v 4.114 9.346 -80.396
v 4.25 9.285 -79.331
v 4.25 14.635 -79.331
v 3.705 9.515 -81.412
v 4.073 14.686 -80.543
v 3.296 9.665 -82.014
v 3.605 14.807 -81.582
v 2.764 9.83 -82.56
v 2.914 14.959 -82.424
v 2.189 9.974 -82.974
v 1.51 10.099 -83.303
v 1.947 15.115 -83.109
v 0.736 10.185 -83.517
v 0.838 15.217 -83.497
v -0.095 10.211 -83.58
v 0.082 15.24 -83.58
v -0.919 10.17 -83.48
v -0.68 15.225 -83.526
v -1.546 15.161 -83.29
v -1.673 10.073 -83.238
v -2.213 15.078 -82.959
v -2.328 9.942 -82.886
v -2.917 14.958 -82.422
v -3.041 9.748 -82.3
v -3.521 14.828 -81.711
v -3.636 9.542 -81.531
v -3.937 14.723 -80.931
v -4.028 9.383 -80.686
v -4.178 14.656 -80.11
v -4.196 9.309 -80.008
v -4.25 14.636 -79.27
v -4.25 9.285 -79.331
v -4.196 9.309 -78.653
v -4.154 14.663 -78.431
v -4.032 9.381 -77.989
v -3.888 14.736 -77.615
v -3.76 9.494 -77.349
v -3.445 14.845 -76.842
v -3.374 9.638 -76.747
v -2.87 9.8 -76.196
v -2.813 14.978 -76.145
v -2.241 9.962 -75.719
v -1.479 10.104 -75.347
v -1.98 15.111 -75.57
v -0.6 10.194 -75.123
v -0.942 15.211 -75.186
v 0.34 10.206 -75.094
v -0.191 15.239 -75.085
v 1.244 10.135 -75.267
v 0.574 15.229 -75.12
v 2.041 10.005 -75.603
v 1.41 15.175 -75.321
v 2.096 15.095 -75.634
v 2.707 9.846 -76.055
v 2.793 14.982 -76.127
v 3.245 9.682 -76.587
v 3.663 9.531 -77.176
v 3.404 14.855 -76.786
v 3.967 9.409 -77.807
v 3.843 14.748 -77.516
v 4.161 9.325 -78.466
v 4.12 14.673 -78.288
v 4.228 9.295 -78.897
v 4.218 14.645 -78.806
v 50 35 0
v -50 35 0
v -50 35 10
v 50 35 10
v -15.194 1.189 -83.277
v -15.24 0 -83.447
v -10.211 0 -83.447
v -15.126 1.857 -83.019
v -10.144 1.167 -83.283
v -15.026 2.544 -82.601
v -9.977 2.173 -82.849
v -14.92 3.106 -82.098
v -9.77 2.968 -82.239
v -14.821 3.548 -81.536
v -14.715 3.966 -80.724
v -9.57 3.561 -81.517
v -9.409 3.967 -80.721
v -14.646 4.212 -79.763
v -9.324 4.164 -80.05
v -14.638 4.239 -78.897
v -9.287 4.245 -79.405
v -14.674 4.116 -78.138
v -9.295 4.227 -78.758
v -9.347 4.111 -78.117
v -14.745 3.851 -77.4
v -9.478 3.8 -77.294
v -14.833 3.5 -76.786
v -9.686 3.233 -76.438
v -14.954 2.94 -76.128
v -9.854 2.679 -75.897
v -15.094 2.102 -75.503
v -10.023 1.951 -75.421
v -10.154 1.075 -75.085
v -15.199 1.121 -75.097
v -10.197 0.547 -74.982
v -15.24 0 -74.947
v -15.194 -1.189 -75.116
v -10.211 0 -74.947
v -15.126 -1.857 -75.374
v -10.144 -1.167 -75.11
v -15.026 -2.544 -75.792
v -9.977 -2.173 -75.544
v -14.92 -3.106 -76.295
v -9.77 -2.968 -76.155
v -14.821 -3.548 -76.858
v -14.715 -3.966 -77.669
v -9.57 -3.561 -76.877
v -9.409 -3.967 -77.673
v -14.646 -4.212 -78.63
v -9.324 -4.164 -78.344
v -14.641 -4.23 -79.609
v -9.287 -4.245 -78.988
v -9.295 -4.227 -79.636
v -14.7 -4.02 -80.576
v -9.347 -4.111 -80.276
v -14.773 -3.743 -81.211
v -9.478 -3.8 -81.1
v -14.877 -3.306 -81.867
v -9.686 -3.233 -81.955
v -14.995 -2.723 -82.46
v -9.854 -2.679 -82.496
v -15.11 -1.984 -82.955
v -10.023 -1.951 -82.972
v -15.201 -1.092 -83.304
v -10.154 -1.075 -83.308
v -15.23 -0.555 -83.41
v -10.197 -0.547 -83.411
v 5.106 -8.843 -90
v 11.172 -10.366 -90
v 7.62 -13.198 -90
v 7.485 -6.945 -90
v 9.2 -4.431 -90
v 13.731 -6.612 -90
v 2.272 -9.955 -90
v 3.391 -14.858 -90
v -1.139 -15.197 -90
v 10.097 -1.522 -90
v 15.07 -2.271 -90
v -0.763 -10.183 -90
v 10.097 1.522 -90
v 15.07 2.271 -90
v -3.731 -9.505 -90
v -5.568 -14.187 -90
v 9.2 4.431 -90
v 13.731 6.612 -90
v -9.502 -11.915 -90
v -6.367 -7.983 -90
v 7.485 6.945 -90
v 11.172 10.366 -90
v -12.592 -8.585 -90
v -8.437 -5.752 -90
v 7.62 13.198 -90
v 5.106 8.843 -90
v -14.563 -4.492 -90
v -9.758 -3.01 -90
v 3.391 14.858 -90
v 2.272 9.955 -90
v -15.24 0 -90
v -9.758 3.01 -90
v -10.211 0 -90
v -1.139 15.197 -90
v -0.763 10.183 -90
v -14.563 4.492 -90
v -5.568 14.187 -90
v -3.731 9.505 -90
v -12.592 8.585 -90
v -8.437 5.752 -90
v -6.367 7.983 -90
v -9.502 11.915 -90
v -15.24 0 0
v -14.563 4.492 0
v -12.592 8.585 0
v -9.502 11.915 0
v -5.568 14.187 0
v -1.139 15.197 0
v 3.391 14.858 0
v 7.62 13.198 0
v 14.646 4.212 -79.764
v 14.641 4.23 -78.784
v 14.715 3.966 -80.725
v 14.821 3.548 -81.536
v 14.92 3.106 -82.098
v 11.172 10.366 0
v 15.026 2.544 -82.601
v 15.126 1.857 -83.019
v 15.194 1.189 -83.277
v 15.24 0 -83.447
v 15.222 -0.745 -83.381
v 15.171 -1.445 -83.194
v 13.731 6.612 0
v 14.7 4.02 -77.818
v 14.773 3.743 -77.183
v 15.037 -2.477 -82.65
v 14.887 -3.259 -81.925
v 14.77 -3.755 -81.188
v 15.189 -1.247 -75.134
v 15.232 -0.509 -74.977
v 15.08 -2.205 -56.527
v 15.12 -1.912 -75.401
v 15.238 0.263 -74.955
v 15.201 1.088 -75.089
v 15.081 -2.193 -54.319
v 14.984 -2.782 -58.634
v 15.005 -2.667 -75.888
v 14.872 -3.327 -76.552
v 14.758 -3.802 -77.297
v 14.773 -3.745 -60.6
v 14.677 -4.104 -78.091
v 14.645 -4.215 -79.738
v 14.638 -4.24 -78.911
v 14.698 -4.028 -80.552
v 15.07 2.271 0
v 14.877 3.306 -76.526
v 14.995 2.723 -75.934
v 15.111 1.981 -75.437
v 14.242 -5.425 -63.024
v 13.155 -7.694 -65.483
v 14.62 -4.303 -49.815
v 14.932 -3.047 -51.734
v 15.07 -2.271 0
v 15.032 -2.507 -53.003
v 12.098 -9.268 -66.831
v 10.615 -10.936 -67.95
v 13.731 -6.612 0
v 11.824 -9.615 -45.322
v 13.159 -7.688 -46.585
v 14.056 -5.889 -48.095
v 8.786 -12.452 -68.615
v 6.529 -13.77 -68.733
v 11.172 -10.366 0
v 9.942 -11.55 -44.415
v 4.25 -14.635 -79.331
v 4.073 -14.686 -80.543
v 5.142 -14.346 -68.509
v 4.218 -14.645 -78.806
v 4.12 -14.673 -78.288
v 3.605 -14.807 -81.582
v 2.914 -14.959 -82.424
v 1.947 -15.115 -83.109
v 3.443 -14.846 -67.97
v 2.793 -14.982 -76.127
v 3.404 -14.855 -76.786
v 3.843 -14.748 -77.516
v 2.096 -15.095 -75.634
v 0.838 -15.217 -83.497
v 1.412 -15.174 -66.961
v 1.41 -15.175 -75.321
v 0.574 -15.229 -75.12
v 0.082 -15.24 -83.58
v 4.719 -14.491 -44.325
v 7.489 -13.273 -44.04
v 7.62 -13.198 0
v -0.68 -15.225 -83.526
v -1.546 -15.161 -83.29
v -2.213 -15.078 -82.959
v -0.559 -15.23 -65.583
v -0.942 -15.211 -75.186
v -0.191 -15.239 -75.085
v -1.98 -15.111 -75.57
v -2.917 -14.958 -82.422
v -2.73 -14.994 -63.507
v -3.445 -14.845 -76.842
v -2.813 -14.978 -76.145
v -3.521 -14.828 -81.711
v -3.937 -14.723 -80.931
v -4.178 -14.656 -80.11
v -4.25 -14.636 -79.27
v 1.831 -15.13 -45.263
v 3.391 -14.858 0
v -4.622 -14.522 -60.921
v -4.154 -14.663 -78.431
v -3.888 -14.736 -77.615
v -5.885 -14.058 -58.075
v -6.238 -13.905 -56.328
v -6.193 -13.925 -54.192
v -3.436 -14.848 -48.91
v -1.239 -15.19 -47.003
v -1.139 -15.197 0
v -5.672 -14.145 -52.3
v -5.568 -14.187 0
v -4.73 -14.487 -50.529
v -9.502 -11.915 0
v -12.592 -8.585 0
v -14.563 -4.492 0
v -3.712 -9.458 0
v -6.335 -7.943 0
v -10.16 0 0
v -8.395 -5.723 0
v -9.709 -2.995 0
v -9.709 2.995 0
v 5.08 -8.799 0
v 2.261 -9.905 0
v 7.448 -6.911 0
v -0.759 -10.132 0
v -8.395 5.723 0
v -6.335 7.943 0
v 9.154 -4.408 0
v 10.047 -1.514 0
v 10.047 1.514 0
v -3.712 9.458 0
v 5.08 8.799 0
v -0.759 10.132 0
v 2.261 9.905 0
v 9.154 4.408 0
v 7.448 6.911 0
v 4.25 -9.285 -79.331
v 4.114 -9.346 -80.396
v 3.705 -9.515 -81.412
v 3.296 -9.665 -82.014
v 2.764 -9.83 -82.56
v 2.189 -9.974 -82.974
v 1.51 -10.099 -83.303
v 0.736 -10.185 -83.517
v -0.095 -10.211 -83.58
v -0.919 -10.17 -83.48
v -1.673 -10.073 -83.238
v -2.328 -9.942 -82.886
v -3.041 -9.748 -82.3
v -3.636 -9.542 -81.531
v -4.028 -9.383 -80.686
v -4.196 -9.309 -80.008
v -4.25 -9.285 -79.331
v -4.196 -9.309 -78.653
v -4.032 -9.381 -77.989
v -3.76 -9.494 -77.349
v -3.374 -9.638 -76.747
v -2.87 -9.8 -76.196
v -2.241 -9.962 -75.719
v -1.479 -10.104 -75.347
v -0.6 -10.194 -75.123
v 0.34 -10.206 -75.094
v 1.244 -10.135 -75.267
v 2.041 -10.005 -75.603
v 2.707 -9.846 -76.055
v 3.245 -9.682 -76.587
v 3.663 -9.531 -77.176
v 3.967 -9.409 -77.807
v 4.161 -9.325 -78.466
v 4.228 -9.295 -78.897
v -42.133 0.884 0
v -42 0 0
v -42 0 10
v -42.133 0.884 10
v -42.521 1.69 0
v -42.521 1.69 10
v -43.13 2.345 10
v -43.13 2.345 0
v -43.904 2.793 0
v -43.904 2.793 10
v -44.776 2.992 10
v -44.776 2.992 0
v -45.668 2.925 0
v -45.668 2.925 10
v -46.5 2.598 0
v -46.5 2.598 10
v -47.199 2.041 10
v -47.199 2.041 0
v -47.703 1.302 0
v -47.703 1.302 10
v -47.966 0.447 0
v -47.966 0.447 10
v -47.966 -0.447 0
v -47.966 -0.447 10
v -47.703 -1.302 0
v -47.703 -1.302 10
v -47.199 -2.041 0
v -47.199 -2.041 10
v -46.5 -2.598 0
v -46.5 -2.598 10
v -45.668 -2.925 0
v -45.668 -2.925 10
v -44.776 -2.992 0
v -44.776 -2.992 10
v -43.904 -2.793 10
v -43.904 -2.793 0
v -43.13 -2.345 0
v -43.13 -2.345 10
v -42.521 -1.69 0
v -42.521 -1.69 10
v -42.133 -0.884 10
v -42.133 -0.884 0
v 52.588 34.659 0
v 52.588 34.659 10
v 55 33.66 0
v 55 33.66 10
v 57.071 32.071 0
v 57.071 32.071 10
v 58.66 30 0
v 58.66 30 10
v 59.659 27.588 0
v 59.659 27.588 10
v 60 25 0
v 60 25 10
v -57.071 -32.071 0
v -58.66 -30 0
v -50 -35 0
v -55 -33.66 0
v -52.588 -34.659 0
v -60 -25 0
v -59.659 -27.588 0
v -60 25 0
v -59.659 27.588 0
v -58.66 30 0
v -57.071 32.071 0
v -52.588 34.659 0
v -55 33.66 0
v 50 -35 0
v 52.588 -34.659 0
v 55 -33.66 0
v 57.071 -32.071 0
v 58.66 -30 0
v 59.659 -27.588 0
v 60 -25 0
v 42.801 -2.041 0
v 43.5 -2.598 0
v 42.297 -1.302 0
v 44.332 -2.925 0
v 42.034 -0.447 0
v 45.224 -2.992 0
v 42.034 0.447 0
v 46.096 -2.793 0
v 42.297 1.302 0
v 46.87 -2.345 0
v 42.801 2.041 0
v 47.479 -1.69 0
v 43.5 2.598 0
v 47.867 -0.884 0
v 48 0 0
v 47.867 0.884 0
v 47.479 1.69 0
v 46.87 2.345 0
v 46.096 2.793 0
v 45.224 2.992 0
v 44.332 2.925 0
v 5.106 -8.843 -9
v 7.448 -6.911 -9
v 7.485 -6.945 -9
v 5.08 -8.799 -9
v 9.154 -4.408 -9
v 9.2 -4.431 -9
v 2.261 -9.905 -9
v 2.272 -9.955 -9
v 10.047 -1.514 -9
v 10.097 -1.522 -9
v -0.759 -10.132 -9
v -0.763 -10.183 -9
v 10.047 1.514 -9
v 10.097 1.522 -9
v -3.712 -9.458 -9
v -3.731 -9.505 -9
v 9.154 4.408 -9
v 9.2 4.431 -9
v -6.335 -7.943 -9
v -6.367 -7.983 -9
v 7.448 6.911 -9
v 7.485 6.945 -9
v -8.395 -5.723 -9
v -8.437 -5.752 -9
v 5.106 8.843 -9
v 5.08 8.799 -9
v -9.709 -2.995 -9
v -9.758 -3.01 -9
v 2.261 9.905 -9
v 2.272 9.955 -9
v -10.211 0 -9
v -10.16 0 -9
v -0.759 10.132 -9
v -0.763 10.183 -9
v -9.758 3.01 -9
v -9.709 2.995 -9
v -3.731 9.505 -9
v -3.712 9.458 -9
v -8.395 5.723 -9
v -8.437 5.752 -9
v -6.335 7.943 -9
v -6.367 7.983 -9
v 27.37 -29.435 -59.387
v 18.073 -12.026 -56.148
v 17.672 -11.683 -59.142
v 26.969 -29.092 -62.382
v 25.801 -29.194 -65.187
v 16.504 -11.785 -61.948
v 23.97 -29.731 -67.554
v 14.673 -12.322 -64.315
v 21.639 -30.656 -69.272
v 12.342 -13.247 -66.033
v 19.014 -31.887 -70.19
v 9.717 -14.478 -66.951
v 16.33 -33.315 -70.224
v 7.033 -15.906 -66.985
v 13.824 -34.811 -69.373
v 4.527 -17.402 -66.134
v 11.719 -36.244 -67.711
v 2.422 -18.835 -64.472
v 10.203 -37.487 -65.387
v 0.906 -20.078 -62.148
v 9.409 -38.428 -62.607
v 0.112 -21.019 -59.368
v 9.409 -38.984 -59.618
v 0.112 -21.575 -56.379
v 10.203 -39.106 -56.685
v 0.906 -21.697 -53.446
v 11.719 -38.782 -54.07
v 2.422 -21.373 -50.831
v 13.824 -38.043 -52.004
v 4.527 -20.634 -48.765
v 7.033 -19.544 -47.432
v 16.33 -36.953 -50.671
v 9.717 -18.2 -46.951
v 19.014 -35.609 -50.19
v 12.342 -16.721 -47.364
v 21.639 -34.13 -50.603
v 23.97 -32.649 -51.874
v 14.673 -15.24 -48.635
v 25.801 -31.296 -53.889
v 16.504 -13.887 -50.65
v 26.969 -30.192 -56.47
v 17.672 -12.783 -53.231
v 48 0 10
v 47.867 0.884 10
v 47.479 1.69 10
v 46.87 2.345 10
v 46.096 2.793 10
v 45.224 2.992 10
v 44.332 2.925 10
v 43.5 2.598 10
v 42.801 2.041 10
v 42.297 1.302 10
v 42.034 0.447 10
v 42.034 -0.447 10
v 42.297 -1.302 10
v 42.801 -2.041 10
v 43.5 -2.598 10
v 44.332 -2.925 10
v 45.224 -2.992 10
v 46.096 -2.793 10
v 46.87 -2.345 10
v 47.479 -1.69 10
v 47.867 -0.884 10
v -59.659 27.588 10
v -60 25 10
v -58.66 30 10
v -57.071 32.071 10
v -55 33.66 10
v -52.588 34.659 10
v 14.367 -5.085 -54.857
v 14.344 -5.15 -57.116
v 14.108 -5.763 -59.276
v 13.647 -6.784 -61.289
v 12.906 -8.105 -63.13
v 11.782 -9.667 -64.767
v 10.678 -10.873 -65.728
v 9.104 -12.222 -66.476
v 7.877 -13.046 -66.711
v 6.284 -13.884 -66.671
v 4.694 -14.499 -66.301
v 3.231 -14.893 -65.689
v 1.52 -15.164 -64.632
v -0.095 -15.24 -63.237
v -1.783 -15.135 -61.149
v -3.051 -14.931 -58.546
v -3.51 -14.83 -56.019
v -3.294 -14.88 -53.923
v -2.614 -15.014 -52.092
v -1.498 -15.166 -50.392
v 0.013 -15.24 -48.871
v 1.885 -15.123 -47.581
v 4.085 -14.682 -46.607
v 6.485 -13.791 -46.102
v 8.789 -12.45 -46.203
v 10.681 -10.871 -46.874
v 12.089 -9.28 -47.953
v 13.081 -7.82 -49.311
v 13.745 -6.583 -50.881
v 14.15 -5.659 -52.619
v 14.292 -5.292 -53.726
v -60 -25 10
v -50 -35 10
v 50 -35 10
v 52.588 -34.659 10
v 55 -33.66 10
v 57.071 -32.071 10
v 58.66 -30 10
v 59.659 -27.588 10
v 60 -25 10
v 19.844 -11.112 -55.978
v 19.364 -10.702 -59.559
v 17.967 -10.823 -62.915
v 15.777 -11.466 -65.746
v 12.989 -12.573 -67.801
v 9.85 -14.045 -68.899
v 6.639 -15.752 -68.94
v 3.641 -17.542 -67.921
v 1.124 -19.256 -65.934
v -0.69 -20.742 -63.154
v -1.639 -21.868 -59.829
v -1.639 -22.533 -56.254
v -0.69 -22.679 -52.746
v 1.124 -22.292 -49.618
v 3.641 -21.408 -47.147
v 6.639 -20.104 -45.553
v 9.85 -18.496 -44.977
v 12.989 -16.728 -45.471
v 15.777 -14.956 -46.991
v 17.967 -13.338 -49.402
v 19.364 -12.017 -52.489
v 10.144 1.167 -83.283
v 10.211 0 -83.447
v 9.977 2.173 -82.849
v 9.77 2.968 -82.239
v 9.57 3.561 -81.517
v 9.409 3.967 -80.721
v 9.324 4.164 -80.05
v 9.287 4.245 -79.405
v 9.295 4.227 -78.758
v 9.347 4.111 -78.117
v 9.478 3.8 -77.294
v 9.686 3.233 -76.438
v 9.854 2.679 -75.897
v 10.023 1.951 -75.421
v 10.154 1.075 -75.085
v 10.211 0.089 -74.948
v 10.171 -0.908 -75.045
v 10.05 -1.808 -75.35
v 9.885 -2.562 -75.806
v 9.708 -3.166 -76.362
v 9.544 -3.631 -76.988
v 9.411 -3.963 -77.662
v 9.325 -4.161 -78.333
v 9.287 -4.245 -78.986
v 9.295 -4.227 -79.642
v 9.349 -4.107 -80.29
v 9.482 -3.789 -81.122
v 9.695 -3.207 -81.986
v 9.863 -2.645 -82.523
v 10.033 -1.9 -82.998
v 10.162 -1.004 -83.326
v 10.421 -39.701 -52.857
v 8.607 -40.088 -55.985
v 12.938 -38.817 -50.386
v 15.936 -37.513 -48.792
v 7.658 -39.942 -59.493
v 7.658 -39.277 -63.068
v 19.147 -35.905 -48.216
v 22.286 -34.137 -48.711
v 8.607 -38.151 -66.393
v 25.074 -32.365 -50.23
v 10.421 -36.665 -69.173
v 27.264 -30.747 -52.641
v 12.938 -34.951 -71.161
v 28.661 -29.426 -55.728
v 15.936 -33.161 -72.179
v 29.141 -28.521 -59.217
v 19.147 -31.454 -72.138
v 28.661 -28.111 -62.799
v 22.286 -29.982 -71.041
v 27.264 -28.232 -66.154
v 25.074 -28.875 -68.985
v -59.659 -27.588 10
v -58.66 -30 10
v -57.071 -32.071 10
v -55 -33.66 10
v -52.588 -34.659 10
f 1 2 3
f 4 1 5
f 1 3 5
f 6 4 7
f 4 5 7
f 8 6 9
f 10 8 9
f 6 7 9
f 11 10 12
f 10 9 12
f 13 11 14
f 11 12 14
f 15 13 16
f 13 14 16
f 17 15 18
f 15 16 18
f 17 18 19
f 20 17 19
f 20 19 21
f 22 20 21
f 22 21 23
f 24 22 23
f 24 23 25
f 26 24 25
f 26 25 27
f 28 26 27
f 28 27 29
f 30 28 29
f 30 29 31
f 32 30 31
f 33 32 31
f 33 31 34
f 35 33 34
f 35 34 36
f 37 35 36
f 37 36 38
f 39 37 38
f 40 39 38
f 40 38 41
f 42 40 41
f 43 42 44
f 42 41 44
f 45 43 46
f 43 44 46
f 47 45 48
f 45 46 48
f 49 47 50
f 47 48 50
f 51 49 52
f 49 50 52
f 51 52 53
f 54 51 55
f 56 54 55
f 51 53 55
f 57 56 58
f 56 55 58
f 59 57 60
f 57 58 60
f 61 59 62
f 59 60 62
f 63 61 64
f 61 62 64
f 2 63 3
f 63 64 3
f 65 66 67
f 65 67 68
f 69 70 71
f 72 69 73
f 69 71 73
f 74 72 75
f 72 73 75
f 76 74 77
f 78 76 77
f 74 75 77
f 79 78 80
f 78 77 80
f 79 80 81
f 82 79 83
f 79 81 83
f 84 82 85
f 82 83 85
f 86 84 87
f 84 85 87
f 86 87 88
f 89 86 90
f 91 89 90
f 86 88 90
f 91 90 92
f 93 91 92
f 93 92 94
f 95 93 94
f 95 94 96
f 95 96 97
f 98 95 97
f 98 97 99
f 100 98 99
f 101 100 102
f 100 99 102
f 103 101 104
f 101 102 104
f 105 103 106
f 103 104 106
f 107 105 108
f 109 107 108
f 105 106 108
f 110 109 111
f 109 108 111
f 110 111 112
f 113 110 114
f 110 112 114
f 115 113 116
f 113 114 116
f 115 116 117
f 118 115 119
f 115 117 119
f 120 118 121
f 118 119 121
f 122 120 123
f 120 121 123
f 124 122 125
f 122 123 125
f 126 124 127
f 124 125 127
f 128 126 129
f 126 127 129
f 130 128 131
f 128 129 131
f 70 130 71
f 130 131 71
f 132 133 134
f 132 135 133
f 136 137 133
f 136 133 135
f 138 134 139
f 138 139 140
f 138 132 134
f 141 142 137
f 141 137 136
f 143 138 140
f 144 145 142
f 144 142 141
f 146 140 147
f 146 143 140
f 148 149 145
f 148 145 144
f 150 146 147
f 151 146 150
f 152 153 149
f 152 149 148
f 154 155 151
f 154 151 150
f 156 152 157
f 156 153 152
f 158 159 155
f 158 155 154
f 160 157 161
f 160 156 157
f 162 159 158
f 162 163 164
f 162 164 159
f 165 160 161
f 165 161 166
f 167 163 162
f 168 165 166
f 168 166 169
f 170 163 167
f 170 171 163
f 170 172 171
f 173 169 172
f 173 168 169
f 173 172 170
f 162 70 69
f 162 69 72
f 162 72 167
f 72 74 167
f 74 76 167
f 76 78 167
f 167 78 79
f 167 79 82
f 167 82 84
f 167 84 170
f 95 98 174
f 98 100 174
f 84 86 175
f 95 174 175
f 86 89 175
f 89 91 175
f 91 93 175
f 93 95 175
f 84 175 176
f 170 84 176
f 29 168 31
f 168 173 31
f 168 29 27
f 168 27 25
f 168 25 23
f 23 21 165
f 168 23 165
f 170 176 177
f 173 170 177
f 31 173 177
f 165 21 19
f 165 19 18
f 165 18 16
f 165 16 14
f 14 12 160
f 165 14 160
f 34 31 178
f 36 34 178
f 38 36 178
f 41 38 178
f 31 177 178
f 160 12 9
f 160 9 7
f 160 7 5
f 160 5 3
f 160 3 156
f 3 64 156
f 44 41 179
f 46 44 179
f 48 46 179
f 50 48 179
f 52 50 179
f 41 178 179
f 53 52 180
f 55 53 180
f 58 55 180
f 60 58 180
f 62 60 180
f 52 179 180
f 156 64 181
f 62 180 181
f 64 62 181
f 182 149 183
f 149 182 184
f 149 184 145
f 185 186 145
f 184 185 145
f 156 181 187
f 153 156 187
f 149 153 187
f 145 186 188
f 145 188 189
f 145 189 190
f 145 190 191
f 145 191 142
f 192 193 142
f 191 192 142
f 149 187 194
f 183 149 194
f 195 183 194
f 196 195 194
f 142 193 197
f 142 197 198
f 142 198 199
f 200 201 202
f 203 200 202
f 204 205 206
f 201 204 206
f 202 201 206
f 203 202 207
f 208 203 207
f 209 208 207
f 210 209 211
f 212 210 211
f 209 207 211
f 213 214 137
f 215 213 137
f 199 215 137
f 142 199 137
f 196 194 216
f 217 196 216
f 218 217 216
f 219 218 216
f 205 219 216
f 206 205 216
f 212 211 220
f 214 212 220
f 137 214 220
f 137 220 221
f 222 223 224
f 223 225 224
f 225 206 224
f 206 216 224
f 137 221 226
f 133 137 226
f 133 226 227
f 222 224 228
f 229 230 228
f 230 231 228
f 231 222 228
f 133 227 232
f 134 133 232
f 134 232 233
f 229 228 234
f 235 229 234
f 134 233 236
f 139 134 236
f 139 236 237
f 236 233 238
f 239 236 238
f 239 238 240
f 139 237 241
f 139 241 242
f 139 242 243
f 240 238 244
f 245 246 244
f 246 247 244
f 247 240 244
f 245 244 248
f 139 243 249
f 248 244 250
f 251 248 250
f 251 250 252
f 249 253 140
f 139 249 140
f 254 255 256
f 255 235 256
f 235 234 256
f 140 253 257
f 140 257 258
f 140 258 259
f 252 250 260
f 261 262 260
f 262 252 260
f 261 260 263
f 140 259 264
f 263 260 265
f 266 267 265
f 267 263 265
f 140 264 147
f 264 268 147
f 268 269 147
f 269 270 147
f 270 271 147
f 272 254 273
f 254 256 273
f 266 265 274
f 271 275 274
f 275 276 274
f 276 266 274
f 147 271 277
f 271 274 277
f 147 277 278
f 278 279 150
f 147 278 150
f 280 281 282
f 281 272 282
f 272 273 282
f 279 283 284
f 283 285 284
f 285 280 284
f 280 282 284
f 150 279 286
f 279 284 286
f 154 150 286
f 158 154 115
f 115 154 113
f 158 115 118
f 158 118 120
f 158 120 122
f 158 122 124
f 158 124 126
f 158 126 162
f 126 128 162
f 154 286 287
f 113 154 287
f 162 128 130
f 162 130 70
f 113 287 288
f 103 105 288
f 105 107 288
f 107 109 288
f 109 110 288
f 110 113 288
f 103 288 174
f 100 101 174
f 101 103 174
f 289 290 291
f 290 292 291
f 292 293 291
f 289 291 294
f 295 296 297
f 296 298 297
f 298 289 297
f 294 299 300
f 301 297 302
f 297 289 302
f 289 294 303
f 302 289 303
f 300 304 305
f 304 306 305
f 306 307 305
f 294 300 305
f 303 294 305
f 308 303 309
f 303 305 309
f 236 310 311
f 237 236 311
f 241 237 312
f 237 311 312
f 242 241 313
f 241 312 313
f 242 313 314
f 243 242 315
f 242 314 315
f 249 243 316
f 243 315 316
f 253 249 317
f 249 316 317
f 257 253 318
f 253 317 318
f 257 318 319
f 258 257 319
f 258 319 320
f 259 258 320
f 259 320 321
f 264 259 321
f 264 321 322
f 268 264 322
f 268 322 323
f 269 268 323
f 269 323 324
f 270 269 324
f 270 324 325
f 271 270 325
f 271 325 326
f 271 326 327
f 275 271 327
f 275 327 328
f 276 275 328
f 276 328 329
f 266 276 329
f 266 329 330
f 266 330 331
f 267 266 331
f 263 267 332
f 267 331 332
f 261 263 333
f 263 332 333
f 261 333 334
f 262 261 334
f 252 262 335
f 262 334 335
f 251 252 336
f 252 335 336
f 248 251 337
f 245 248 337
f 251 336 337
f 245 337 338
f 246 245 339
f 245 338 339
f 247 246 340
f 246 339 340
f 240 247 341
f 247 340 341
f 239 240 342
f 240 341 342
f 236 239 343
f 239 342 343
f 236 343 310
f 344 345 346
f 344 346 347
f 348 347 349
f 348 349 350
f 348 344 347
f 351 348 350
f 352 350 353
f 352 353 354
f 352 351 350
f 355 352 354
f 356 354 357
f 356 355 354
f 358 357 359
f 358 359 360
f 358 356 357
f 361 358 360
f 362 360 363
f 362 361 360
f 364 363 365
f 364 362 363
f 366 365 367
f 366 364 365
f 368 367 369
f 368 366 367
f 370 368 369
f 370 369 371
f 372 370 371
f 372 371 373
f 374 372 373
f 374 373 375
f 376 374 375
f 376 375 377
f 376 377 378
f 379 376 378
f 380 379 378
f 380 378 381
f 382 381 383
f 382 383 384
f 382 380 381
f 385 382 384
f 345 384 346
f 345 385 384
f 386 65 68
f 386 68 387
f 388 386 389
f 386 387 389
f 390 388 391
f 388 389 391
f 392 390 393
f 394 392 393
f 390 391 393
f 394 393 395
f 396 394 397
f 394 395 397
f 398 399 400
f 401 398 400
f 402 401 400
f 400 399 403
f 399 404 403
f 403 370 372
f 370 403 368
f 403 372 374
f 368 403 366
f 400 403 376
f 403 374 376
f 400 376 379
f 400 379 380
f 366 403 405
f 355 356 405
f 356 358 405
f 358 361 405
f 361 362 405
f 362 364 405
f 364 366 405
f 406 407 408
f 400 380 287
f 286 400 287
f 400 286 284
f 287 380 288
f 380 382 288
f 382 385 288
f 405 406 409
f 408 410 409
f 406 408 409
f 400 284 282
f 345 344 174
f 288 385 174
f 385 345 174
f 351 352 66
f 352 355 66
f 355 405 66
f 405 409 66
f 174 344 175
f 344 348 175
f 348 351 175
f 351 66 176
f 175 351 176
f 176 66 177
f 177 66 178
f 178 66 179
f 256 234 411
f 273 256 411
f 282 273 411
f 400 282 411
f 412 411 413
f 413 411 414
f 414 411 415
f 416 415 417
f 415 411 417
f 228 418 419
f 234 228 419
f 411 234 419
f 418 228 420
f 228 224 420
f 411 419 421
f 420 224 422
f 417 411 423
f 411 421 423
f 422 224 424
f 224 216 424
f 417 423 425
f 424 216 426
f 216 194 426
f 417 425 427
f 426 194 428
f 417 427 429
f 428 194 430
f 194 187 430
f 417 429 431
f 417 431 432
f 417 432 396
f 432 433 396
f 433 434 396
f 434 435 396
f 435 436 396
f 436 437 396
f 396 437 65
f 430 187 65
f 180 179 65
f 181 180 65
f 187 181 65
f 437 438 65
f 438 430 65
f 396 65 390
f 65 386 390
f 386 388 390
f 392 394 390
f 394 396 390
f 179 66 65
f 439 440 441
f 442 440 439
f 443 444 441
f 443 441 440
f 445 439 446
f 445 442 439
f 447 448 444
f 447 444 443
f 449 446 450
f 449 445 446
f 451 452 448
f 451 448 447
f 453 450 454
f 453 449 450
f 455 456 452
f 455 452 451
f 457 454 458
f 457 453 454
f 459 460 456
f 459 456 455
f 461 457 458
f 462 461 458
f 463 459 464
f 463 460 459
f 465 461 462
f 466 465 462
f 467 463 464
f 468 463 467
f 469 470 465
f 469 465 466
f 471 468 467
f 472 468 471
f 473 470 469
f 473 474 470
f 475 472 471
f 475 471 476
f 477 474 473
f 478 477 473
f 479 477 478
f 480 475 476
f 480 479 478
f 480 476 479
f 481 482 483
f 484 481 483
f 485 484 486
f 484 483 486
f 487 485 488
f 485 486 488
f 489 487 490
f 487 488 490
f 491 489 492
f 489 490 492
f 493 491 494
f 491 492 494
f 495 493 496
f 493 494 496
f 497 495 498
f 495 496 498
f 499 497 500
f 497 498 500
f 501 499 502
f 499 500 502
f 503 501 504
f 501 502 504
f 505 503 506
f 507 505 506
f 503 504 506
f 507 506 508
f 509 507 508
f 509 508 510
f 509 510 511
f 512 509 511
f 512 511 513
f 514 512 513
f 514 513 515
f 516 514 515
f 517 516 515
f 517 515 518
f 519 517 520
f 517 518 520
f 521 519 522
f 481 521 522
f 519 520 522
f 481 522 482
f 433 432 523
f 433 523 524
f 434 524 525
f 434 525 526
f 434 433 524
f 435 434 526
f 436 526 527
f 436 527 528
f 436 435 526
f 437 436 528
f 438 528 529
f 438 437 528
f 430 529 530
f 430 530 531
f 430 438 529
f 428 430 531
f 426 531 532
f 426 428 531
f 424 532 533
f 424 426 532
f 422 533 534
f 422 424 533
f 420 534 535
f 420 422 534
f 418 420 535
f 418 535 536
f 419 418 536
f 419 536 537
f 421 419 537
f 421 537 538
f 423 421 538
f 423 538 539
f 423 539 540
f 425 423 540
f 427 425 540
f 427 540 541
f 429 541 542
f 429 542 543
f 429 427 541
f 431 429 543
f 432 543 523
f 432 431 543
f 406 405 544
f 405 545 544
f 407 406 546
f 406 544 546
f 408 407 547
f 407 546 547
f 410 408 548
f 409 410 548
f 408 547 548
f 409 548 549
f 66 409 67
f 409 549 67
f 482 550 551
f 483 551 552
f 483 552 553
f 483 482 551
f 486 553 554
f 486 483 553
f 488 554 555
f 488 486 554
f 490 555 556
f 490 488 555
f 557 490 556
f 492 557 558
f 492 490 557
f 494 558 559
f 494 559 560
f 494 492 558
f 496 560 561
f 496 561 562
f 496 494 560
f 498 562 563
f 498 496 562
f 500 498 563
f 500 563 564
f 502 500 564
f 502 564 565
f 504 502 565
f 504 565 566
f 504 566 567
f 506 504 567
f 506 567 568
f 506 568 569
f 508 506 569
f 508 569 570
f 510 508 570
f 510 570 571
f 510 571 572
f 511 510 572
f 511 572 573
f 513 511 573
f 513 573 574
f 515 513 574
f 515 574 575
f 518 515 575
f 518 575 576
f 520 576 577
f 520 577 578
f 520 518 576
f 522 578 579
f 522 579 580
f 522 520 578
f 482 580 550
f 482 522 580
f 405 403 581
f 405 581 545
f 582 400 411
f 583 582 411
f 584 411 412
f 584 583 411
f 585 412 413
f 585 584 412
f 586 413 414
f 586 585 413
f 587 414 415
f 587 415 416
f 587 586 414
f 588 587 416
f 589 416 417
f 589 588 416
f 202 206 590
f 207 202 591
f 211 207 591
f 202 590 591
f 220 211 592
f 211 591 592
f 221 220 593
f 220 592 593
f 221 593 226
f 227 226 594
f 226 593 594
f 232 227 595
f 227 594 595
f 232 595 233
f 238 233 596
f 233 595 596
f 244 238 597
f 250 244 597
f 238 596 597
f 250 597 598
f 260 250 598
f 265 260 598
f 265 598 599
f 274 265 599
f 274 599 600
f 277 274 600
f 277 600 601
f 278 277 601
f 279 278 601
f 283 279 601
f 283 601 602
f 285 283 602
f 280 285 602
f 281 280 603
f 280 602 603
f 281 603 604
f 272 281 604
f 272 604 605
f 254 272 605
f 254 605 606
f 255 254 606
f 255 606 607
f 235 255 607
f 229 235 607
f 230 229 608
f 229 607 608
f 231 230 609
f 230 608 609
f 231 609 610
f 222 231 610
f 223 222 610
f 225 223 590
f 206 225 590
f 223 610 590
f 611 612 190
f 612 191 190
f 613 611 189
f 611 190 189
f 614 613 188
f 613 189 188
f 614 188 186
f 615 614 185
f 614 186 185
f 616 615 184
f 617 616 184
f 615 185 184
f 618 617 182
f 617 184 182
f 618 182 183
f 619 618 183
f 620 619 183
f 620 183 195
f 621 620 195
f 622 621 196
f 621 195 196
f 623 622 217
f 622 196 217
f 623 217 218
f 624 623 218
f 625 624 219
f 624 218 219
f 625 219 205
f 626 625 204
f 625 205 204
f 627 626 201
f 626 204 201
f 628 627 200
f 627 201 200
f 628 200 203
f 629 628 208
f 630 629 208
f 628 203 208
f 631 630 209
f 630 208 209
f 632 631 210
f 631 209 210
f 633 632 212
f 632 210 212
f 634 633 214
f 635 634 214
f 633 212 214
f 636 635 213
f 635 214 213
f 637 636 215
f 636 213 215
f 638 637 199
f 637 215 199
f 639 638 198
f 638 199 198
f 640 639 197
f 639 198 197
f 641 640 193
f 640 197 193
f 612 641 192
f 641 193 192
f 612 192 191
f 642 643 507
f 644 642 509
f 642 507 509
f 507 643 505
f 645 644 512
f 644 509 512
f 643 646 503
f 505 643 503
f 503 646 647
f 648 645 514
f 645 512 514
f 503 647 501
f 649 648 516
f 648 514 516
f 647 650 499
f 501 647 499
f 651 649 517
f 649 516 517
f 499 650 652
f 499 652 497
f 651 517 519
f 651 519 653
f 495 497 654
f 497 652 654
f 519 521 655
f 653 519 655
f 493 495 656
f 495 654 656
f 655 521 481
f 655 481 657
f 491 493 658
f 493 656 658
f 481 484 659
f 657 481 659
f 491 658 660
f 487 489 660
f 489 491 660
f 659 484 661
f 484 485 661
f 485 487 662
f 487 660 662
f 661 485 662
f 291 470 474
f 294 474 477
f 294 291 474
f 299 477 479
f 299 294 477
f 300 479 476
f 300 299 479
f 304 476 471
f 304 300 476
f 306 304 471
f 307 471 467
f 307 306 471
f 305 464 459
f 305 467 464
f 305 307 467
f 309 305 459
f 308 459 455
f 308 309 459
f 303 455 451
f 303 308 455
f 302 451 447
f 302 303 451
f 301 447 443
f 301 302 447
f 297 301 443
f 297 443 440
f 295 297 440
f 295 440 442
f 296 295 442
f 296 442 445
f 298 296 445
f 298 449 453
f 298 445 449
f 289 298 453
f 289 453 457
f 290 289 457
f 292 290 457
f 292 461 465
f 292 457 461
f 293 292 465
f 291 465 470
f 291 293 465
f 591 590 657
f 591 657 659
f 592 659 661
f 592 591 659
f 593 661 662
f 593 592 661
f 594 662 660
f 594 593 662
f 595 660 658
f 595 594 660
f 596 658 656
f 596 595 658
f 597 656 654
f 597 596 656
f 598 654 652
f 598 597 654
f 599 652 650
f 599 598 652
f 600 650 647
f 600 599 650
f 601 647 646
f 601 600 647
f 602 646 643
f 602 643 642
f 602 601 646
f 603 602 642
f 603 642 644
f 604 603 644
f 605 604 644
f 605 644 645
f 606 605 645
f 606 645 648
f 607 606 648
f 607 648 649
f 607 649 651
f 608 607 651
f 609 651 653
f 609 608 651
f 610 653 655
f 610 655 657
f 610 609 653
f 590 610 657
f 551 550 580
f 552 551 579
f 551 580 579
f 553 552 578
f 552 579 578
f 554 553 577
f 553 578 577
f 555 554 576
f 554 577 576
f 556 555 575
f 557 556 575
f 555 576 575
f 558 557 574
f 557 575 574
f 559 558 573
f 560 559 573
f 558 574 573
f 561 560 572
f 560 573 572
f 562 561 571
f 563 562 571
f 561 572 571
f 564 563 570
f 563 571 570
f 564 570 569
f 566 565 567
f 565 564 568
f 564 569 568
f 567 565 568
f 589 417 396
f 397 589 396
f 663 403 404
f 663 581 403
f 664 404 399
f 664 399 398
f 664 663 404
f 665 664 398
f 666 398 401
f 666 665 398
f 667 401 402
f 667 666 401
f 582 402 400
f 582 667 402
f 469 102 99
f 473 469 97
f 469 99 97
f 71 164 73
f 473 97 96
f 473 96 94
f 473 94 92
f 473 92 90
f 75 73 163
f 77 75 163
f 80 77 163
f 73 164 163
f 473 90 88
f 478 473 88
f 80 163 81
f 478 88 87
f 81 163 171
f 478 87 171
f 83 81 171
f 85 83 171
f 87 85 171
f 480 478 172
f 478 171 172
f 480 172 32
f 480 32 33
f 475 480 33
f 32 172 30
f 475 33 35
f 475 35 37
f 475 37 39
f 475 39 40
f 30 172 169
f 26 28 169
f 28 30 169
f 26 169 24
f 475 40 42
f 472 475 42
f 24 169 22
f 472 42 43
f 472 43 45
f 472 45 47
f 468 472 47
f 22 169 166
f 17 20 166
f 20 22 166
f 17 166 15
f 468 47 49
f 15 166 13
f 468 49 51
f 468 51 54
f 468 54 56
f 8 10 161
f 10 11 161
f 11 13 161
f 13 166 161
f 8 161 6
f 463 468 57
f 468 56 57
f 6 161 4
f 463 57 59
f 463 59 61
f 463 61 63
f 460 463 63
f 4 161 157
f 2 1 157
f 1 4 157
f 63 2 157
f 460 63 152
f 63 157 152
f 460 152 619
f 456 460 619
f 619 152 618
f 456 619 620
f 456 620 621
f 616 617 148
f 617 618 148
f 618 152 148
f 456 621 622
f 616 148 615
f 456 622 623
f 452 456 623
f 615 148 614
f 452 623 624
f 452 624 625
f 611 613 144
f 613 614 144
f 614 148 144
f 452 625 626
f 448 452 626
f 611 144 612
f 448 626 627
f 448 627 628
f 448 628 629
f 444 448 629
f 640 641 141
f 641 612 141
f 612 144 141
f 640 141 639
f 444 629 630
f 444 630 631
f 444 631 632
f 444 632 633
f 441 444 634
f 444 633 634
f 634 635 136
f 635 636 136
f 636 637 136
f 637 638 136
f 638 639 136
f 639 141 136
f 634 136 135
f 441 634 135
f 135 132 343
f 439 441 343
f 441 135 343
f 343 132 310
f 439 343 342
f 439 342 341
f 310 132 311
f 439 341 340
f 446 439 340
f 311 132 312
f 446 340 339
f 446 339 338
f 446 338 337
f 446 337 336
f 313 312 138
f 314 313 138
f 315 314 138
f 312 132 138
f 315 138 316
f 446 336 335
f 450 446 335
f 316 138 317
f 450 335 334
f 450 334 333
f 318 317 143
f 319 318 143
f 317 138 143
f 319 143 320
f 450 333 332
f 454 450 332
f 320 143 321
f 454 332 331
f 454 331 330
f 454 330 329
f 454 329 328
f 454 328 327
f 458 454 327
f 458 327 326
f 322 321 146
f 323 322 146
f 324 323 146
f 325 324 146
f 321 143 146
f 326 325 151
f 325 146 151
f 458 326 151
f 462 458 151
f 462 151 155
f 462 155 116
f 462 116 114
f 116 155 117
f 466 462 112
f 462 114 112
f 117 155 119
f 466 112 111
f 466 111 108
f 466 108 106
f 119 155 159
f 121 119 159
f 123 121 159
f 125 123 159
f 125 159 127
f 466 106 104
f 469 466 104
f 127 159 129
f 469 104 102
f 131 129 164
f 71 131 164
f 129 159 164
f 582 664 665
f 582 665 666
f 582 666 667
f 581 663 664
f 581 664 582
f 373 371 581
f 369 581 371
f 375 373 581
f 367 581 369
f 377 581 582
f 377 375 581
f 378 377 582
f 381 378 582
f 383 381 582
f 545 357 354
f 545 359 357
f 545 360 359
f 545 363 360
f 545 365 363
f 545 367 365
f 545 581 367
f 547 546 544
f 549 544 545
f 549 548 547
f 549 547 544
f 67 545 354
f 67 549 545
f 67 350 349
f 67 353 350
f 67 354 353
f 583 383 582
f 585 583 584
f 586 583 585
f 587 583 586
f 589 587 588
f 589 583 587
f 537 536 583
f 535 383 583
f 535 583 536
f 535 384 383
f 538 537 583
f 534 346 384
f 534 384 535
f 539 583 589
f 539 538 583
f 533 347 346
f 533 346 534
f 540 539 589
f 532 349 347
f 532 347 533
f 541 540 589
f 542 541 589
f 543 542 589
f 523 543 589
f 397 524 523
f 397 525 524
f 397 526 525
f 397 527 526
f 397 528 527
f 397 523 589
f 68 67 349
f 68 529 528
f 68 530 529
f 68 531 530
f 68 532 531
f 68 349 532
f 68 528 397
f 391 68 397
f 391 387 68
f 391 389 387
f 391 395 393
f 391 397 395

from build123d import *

# Parameters (mm, degrees)
SKETCH1_W                = 120
SKETCH1_H                = 70
SKETCH1_R                = 3
BOSS_EXTRUDE1_DEPTH      = 10
SKETCH2_R                = 15.24
SKETCH2_R_2              = 10.16
BOSS_EXTRUDE2_DEPTH      = 90
BOSS_EXTRUDE4_DEPTH      = 27
BOSS_EXTRUDE4_DEPTH_BACK = 20
SKETCH4_R                = 12.2
SKETCH4_R_2              = 10.2
SKETCH6_R                = 4.25
CUT_EXTRUDE1_DEPTH       = 58
SKETCH7_R                = 4.25
CUT_EXTRUDE2_DEPTH       = 81
FILLET1_R                = 10
SKETCH8_R                = 10.211266942
CUT_EXTRUDE3_DEPTH       = 81


with BuildPart() as part:
    # Sketch1 → Boss-Extrude1 (new body)
    with BuildSketch(Plane.XY):
        Rectangle(SKETCH1_W, SKETCH1_H)
        with Locations((-45, 0)):
            Circle(SKETCH1_R, mode=Mode.SUBTRACT)
        with Locations((45, 0)):
            Circle(SKETCH1_R, mode=Mode.SUBTRACT)
    extrude(amount=BOSS_EXTRUDE1_DEPTH)

    # Sketch2 → Boss-Extrude2 (add)
    with BuildSketch(Plane(origin=(0, 0, 0), x_dir=(-1, 0, 0), z_dir=(0, 0, -1))):
        Circle(SKETCH2_R)
        Circle(SKETCH2_R_2, mode=Mode.SUBTRACT)
    extrude(amount=BOSS_EXTRUDE2_DEPTH)

    # Sketch4 → Boss-Extrude4 (add, two sides: drawn at the far end of the back side and taken through both)
    with BuildSketch(Plane(origin=(12.998571072, -24.340292843, -4.528818833), x_dir=(0.8853889944012755, 0.45700753148549944, 0.08503202196013275), z_dir=(-0.46485086704565615, 0.870450003260969, 0.16195821445632522)).offset(-BOSS_EXTRUDE4_DEPTH_BACK)):
        with Locations((-4.468384796, 53.00095998)):
            Circle(SKETCH4_R)
        with Locations((-4.468384796, 53.00095998)):
            Circle(SKETCH4_R_2, mode=Mode.SUBTRACT)
    extrude(amount=BOSS_EXTRUDE4_DEPTH + BOSS_EXTRUDE4_DEPTH_BACK)

    # Sketch6 → Cut-Extrude1 (cut)
    with BuildSketch(Plane(origin=(0, 35, 0), x_dir=(1, 0, 0), z_dir=(0, 1, 0))):
        with Locations((0, 79.330798524)):
            Circle(SKETCH6_R)
    extrude(amount=-CUT_EXTRUDE1_DEPTH, mode=Mode.SUBTRACT)

    # Sketch7 → Cut-Extrude2 (cut)
    with BuildSketch(Plane(origin=(60, 0, 0), x_dir=(0, 0, -1), z_dir=(1, 0, 0))):
        with Locations((79.196792396, 0)):
            Circle(SKETCH7_R)
    extrude(amount=-CUT_EXTRUDE2_DEPTH, mode=Mode.SUBTRACT)

    # Fillet1
    fillet1_edges = [part.edges().sort_by_distance(p)[0] for p in [
        (60, -35, 5),
        (-60, -35, 5),
        (-60, 35, 5),
        (60, 35, 5),
    ]]
    fillet(fillet1_edges, radius=FILLET1_R)

    # Sketch8 → Cut-Extrude3 (cut)
    with BuildSketch(Plane(origin=(0, 0, -90), x_dir=(-1, 0, 0), z_dir=(0, 0, -1))):
        Circle(SKETCH8_R)
    extrude(amount=-CUT_EXTRUDE3_DEPTH, mode=Mode.SUBTRACT)


solid = part.part
